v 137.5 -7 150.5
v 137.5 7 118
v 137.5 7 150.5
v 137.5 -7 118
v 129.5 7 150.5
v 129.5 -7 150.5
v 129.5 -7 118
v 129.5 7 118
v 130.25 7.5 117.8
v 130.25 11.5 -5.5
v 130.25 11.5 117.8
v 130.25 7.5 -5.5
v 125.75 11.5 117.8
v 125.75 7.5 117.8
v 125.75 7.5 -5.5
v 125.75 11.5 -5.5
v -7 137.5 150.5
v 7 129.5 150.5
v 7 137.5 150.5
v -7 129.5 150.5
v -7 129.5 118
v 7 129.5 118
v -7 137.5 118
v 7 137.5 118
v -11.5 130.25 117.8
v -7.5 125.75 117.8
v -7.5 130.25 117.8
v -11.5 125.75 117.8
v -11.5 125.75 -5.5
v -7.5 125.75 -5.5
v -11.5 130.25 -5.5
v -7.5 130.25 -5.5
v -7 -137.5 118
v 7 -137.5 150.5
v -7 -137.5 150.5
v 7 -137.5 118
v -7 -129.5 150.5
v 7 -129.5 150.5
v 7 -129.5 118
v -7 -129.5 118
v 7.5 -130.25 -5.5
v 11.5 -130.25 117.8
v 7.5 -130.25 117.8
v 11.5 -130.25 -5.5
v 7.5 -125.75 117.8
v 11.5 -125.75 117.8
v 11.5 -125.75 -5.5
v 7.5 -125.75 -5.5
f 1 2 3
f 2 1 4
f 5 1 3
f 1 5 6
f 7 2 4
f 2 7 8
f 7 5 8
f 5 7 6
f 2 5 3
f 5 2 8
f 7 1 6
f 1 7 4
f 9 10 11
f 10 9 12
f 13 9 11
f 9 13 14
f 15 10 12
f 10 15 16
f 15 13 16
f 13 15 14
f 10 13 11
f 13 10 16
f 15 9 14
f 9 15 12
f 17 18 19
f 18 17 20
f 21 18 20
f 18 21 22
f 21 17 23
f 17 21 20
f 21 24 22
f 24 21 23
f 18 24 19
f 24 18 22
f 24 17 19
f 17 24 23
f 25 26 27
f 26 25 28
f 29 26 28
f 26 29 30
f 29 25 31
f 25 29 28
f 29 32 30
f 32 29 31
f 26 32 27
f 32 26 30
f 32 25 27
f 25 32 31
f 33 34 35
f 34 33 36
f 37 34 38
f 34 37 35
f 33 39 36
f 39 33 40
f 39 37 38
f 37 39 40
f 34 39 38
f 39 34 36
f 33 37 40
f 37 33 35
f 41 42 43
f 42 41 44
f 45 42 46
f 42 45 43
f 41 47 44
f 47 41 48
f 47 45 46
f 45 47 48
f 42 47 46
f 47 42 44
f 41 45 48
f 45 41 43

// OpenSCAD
// ============================================================================
// Atom Lithography Machine — Parametric OpenSCAD Module (S4.4-02)
// ============================================================================
// part_id           : S4.4-02
// parent_bom_id     : S4.4
// subsystem         : S4
// part_name         : UHV diferansiyel duzlem-ayna optik interferometre kafalari (X, Y, Z)
// material          : Invar-36
// temp_stage        : 300 K
// vacuum_grade      : UHV 1e-9 mbar
// tolerance         : ±0.1 nm
// computed_mass_kg  : 0.10246
// envelope_mm       : 149.000 x 275.000 x 156.000
// design_maturity   : M0_M1_DETAILED_CAD_DESIGN_ONLY
// no_lab_measurement: true
// iec61508_certified: false
// semi_s2_certified : false
// Units: millimeters (mm)
// ============================================================================

$fn = 64;

// Nominal bounding envelope parameters (mm)
bbox_x = 149.0000;
bbox_y = 275.0000;
bbox_z = 156.0000;

// Part-specific parametric dimensions
n_heads = 3;
relay_radius_mm = 128.0;
z_entry_mm = -133.0;
z_meas_mm = -9.0;
z_ref_mm = 14.3;

// Interface / port parameters (mm)

module part_S4_4_02() {
  union() {
    // Split-gap differential PBS head X-axis (Z_canon=[485, 517.5])
    translate([133.500, 0.000, 134.250]) cube([8.000, 14.000, 32.500], center=true);
    // Periscope optical relay mast X-axis
    translate([128.000, 9.500, 56.150]) cube([4.500, 4.000, 123.300], center=true);
    // Split-gap differential PBS head Y-axis (Z_canon=[485, 517.5])
    translate([0.000, 133.500, 134.250]) rotate([0.000, 0.000, 90.000]) cube([8.000, 14.000, 32.500], center=true);
    // Periscope optical relay mast Y-axis
    translate([-9.500, 128.000, 56.150]) rotate([0.000, 0.000, 90.000]) cube([4.500, 4.000, 123.300], center=true);
    // Split-gap differential PBS head Z-axis (Z_canon=[485, 517.5])
    translate([-0.000, -133.500, 134.250]) rotate([0.000, 0.000, 270.000]) cube([8.000, 14.000, 32.500], center=true);
    // Periscope optical relay mast Z-axis
    translate([9.500, -128.000, 56.150]) rotate([0.000, 0.000, 270.000]) cube([4.500, 4.000, 123.300], center=true);
  }
}

// World assembly mounting transform (global machine frame, mm / deg):
// translate([0.000, 0.000, -133.000]) rotate([0.000, 0.000, 0.000]) part_S4_4_02();

part_S4_4_02();
